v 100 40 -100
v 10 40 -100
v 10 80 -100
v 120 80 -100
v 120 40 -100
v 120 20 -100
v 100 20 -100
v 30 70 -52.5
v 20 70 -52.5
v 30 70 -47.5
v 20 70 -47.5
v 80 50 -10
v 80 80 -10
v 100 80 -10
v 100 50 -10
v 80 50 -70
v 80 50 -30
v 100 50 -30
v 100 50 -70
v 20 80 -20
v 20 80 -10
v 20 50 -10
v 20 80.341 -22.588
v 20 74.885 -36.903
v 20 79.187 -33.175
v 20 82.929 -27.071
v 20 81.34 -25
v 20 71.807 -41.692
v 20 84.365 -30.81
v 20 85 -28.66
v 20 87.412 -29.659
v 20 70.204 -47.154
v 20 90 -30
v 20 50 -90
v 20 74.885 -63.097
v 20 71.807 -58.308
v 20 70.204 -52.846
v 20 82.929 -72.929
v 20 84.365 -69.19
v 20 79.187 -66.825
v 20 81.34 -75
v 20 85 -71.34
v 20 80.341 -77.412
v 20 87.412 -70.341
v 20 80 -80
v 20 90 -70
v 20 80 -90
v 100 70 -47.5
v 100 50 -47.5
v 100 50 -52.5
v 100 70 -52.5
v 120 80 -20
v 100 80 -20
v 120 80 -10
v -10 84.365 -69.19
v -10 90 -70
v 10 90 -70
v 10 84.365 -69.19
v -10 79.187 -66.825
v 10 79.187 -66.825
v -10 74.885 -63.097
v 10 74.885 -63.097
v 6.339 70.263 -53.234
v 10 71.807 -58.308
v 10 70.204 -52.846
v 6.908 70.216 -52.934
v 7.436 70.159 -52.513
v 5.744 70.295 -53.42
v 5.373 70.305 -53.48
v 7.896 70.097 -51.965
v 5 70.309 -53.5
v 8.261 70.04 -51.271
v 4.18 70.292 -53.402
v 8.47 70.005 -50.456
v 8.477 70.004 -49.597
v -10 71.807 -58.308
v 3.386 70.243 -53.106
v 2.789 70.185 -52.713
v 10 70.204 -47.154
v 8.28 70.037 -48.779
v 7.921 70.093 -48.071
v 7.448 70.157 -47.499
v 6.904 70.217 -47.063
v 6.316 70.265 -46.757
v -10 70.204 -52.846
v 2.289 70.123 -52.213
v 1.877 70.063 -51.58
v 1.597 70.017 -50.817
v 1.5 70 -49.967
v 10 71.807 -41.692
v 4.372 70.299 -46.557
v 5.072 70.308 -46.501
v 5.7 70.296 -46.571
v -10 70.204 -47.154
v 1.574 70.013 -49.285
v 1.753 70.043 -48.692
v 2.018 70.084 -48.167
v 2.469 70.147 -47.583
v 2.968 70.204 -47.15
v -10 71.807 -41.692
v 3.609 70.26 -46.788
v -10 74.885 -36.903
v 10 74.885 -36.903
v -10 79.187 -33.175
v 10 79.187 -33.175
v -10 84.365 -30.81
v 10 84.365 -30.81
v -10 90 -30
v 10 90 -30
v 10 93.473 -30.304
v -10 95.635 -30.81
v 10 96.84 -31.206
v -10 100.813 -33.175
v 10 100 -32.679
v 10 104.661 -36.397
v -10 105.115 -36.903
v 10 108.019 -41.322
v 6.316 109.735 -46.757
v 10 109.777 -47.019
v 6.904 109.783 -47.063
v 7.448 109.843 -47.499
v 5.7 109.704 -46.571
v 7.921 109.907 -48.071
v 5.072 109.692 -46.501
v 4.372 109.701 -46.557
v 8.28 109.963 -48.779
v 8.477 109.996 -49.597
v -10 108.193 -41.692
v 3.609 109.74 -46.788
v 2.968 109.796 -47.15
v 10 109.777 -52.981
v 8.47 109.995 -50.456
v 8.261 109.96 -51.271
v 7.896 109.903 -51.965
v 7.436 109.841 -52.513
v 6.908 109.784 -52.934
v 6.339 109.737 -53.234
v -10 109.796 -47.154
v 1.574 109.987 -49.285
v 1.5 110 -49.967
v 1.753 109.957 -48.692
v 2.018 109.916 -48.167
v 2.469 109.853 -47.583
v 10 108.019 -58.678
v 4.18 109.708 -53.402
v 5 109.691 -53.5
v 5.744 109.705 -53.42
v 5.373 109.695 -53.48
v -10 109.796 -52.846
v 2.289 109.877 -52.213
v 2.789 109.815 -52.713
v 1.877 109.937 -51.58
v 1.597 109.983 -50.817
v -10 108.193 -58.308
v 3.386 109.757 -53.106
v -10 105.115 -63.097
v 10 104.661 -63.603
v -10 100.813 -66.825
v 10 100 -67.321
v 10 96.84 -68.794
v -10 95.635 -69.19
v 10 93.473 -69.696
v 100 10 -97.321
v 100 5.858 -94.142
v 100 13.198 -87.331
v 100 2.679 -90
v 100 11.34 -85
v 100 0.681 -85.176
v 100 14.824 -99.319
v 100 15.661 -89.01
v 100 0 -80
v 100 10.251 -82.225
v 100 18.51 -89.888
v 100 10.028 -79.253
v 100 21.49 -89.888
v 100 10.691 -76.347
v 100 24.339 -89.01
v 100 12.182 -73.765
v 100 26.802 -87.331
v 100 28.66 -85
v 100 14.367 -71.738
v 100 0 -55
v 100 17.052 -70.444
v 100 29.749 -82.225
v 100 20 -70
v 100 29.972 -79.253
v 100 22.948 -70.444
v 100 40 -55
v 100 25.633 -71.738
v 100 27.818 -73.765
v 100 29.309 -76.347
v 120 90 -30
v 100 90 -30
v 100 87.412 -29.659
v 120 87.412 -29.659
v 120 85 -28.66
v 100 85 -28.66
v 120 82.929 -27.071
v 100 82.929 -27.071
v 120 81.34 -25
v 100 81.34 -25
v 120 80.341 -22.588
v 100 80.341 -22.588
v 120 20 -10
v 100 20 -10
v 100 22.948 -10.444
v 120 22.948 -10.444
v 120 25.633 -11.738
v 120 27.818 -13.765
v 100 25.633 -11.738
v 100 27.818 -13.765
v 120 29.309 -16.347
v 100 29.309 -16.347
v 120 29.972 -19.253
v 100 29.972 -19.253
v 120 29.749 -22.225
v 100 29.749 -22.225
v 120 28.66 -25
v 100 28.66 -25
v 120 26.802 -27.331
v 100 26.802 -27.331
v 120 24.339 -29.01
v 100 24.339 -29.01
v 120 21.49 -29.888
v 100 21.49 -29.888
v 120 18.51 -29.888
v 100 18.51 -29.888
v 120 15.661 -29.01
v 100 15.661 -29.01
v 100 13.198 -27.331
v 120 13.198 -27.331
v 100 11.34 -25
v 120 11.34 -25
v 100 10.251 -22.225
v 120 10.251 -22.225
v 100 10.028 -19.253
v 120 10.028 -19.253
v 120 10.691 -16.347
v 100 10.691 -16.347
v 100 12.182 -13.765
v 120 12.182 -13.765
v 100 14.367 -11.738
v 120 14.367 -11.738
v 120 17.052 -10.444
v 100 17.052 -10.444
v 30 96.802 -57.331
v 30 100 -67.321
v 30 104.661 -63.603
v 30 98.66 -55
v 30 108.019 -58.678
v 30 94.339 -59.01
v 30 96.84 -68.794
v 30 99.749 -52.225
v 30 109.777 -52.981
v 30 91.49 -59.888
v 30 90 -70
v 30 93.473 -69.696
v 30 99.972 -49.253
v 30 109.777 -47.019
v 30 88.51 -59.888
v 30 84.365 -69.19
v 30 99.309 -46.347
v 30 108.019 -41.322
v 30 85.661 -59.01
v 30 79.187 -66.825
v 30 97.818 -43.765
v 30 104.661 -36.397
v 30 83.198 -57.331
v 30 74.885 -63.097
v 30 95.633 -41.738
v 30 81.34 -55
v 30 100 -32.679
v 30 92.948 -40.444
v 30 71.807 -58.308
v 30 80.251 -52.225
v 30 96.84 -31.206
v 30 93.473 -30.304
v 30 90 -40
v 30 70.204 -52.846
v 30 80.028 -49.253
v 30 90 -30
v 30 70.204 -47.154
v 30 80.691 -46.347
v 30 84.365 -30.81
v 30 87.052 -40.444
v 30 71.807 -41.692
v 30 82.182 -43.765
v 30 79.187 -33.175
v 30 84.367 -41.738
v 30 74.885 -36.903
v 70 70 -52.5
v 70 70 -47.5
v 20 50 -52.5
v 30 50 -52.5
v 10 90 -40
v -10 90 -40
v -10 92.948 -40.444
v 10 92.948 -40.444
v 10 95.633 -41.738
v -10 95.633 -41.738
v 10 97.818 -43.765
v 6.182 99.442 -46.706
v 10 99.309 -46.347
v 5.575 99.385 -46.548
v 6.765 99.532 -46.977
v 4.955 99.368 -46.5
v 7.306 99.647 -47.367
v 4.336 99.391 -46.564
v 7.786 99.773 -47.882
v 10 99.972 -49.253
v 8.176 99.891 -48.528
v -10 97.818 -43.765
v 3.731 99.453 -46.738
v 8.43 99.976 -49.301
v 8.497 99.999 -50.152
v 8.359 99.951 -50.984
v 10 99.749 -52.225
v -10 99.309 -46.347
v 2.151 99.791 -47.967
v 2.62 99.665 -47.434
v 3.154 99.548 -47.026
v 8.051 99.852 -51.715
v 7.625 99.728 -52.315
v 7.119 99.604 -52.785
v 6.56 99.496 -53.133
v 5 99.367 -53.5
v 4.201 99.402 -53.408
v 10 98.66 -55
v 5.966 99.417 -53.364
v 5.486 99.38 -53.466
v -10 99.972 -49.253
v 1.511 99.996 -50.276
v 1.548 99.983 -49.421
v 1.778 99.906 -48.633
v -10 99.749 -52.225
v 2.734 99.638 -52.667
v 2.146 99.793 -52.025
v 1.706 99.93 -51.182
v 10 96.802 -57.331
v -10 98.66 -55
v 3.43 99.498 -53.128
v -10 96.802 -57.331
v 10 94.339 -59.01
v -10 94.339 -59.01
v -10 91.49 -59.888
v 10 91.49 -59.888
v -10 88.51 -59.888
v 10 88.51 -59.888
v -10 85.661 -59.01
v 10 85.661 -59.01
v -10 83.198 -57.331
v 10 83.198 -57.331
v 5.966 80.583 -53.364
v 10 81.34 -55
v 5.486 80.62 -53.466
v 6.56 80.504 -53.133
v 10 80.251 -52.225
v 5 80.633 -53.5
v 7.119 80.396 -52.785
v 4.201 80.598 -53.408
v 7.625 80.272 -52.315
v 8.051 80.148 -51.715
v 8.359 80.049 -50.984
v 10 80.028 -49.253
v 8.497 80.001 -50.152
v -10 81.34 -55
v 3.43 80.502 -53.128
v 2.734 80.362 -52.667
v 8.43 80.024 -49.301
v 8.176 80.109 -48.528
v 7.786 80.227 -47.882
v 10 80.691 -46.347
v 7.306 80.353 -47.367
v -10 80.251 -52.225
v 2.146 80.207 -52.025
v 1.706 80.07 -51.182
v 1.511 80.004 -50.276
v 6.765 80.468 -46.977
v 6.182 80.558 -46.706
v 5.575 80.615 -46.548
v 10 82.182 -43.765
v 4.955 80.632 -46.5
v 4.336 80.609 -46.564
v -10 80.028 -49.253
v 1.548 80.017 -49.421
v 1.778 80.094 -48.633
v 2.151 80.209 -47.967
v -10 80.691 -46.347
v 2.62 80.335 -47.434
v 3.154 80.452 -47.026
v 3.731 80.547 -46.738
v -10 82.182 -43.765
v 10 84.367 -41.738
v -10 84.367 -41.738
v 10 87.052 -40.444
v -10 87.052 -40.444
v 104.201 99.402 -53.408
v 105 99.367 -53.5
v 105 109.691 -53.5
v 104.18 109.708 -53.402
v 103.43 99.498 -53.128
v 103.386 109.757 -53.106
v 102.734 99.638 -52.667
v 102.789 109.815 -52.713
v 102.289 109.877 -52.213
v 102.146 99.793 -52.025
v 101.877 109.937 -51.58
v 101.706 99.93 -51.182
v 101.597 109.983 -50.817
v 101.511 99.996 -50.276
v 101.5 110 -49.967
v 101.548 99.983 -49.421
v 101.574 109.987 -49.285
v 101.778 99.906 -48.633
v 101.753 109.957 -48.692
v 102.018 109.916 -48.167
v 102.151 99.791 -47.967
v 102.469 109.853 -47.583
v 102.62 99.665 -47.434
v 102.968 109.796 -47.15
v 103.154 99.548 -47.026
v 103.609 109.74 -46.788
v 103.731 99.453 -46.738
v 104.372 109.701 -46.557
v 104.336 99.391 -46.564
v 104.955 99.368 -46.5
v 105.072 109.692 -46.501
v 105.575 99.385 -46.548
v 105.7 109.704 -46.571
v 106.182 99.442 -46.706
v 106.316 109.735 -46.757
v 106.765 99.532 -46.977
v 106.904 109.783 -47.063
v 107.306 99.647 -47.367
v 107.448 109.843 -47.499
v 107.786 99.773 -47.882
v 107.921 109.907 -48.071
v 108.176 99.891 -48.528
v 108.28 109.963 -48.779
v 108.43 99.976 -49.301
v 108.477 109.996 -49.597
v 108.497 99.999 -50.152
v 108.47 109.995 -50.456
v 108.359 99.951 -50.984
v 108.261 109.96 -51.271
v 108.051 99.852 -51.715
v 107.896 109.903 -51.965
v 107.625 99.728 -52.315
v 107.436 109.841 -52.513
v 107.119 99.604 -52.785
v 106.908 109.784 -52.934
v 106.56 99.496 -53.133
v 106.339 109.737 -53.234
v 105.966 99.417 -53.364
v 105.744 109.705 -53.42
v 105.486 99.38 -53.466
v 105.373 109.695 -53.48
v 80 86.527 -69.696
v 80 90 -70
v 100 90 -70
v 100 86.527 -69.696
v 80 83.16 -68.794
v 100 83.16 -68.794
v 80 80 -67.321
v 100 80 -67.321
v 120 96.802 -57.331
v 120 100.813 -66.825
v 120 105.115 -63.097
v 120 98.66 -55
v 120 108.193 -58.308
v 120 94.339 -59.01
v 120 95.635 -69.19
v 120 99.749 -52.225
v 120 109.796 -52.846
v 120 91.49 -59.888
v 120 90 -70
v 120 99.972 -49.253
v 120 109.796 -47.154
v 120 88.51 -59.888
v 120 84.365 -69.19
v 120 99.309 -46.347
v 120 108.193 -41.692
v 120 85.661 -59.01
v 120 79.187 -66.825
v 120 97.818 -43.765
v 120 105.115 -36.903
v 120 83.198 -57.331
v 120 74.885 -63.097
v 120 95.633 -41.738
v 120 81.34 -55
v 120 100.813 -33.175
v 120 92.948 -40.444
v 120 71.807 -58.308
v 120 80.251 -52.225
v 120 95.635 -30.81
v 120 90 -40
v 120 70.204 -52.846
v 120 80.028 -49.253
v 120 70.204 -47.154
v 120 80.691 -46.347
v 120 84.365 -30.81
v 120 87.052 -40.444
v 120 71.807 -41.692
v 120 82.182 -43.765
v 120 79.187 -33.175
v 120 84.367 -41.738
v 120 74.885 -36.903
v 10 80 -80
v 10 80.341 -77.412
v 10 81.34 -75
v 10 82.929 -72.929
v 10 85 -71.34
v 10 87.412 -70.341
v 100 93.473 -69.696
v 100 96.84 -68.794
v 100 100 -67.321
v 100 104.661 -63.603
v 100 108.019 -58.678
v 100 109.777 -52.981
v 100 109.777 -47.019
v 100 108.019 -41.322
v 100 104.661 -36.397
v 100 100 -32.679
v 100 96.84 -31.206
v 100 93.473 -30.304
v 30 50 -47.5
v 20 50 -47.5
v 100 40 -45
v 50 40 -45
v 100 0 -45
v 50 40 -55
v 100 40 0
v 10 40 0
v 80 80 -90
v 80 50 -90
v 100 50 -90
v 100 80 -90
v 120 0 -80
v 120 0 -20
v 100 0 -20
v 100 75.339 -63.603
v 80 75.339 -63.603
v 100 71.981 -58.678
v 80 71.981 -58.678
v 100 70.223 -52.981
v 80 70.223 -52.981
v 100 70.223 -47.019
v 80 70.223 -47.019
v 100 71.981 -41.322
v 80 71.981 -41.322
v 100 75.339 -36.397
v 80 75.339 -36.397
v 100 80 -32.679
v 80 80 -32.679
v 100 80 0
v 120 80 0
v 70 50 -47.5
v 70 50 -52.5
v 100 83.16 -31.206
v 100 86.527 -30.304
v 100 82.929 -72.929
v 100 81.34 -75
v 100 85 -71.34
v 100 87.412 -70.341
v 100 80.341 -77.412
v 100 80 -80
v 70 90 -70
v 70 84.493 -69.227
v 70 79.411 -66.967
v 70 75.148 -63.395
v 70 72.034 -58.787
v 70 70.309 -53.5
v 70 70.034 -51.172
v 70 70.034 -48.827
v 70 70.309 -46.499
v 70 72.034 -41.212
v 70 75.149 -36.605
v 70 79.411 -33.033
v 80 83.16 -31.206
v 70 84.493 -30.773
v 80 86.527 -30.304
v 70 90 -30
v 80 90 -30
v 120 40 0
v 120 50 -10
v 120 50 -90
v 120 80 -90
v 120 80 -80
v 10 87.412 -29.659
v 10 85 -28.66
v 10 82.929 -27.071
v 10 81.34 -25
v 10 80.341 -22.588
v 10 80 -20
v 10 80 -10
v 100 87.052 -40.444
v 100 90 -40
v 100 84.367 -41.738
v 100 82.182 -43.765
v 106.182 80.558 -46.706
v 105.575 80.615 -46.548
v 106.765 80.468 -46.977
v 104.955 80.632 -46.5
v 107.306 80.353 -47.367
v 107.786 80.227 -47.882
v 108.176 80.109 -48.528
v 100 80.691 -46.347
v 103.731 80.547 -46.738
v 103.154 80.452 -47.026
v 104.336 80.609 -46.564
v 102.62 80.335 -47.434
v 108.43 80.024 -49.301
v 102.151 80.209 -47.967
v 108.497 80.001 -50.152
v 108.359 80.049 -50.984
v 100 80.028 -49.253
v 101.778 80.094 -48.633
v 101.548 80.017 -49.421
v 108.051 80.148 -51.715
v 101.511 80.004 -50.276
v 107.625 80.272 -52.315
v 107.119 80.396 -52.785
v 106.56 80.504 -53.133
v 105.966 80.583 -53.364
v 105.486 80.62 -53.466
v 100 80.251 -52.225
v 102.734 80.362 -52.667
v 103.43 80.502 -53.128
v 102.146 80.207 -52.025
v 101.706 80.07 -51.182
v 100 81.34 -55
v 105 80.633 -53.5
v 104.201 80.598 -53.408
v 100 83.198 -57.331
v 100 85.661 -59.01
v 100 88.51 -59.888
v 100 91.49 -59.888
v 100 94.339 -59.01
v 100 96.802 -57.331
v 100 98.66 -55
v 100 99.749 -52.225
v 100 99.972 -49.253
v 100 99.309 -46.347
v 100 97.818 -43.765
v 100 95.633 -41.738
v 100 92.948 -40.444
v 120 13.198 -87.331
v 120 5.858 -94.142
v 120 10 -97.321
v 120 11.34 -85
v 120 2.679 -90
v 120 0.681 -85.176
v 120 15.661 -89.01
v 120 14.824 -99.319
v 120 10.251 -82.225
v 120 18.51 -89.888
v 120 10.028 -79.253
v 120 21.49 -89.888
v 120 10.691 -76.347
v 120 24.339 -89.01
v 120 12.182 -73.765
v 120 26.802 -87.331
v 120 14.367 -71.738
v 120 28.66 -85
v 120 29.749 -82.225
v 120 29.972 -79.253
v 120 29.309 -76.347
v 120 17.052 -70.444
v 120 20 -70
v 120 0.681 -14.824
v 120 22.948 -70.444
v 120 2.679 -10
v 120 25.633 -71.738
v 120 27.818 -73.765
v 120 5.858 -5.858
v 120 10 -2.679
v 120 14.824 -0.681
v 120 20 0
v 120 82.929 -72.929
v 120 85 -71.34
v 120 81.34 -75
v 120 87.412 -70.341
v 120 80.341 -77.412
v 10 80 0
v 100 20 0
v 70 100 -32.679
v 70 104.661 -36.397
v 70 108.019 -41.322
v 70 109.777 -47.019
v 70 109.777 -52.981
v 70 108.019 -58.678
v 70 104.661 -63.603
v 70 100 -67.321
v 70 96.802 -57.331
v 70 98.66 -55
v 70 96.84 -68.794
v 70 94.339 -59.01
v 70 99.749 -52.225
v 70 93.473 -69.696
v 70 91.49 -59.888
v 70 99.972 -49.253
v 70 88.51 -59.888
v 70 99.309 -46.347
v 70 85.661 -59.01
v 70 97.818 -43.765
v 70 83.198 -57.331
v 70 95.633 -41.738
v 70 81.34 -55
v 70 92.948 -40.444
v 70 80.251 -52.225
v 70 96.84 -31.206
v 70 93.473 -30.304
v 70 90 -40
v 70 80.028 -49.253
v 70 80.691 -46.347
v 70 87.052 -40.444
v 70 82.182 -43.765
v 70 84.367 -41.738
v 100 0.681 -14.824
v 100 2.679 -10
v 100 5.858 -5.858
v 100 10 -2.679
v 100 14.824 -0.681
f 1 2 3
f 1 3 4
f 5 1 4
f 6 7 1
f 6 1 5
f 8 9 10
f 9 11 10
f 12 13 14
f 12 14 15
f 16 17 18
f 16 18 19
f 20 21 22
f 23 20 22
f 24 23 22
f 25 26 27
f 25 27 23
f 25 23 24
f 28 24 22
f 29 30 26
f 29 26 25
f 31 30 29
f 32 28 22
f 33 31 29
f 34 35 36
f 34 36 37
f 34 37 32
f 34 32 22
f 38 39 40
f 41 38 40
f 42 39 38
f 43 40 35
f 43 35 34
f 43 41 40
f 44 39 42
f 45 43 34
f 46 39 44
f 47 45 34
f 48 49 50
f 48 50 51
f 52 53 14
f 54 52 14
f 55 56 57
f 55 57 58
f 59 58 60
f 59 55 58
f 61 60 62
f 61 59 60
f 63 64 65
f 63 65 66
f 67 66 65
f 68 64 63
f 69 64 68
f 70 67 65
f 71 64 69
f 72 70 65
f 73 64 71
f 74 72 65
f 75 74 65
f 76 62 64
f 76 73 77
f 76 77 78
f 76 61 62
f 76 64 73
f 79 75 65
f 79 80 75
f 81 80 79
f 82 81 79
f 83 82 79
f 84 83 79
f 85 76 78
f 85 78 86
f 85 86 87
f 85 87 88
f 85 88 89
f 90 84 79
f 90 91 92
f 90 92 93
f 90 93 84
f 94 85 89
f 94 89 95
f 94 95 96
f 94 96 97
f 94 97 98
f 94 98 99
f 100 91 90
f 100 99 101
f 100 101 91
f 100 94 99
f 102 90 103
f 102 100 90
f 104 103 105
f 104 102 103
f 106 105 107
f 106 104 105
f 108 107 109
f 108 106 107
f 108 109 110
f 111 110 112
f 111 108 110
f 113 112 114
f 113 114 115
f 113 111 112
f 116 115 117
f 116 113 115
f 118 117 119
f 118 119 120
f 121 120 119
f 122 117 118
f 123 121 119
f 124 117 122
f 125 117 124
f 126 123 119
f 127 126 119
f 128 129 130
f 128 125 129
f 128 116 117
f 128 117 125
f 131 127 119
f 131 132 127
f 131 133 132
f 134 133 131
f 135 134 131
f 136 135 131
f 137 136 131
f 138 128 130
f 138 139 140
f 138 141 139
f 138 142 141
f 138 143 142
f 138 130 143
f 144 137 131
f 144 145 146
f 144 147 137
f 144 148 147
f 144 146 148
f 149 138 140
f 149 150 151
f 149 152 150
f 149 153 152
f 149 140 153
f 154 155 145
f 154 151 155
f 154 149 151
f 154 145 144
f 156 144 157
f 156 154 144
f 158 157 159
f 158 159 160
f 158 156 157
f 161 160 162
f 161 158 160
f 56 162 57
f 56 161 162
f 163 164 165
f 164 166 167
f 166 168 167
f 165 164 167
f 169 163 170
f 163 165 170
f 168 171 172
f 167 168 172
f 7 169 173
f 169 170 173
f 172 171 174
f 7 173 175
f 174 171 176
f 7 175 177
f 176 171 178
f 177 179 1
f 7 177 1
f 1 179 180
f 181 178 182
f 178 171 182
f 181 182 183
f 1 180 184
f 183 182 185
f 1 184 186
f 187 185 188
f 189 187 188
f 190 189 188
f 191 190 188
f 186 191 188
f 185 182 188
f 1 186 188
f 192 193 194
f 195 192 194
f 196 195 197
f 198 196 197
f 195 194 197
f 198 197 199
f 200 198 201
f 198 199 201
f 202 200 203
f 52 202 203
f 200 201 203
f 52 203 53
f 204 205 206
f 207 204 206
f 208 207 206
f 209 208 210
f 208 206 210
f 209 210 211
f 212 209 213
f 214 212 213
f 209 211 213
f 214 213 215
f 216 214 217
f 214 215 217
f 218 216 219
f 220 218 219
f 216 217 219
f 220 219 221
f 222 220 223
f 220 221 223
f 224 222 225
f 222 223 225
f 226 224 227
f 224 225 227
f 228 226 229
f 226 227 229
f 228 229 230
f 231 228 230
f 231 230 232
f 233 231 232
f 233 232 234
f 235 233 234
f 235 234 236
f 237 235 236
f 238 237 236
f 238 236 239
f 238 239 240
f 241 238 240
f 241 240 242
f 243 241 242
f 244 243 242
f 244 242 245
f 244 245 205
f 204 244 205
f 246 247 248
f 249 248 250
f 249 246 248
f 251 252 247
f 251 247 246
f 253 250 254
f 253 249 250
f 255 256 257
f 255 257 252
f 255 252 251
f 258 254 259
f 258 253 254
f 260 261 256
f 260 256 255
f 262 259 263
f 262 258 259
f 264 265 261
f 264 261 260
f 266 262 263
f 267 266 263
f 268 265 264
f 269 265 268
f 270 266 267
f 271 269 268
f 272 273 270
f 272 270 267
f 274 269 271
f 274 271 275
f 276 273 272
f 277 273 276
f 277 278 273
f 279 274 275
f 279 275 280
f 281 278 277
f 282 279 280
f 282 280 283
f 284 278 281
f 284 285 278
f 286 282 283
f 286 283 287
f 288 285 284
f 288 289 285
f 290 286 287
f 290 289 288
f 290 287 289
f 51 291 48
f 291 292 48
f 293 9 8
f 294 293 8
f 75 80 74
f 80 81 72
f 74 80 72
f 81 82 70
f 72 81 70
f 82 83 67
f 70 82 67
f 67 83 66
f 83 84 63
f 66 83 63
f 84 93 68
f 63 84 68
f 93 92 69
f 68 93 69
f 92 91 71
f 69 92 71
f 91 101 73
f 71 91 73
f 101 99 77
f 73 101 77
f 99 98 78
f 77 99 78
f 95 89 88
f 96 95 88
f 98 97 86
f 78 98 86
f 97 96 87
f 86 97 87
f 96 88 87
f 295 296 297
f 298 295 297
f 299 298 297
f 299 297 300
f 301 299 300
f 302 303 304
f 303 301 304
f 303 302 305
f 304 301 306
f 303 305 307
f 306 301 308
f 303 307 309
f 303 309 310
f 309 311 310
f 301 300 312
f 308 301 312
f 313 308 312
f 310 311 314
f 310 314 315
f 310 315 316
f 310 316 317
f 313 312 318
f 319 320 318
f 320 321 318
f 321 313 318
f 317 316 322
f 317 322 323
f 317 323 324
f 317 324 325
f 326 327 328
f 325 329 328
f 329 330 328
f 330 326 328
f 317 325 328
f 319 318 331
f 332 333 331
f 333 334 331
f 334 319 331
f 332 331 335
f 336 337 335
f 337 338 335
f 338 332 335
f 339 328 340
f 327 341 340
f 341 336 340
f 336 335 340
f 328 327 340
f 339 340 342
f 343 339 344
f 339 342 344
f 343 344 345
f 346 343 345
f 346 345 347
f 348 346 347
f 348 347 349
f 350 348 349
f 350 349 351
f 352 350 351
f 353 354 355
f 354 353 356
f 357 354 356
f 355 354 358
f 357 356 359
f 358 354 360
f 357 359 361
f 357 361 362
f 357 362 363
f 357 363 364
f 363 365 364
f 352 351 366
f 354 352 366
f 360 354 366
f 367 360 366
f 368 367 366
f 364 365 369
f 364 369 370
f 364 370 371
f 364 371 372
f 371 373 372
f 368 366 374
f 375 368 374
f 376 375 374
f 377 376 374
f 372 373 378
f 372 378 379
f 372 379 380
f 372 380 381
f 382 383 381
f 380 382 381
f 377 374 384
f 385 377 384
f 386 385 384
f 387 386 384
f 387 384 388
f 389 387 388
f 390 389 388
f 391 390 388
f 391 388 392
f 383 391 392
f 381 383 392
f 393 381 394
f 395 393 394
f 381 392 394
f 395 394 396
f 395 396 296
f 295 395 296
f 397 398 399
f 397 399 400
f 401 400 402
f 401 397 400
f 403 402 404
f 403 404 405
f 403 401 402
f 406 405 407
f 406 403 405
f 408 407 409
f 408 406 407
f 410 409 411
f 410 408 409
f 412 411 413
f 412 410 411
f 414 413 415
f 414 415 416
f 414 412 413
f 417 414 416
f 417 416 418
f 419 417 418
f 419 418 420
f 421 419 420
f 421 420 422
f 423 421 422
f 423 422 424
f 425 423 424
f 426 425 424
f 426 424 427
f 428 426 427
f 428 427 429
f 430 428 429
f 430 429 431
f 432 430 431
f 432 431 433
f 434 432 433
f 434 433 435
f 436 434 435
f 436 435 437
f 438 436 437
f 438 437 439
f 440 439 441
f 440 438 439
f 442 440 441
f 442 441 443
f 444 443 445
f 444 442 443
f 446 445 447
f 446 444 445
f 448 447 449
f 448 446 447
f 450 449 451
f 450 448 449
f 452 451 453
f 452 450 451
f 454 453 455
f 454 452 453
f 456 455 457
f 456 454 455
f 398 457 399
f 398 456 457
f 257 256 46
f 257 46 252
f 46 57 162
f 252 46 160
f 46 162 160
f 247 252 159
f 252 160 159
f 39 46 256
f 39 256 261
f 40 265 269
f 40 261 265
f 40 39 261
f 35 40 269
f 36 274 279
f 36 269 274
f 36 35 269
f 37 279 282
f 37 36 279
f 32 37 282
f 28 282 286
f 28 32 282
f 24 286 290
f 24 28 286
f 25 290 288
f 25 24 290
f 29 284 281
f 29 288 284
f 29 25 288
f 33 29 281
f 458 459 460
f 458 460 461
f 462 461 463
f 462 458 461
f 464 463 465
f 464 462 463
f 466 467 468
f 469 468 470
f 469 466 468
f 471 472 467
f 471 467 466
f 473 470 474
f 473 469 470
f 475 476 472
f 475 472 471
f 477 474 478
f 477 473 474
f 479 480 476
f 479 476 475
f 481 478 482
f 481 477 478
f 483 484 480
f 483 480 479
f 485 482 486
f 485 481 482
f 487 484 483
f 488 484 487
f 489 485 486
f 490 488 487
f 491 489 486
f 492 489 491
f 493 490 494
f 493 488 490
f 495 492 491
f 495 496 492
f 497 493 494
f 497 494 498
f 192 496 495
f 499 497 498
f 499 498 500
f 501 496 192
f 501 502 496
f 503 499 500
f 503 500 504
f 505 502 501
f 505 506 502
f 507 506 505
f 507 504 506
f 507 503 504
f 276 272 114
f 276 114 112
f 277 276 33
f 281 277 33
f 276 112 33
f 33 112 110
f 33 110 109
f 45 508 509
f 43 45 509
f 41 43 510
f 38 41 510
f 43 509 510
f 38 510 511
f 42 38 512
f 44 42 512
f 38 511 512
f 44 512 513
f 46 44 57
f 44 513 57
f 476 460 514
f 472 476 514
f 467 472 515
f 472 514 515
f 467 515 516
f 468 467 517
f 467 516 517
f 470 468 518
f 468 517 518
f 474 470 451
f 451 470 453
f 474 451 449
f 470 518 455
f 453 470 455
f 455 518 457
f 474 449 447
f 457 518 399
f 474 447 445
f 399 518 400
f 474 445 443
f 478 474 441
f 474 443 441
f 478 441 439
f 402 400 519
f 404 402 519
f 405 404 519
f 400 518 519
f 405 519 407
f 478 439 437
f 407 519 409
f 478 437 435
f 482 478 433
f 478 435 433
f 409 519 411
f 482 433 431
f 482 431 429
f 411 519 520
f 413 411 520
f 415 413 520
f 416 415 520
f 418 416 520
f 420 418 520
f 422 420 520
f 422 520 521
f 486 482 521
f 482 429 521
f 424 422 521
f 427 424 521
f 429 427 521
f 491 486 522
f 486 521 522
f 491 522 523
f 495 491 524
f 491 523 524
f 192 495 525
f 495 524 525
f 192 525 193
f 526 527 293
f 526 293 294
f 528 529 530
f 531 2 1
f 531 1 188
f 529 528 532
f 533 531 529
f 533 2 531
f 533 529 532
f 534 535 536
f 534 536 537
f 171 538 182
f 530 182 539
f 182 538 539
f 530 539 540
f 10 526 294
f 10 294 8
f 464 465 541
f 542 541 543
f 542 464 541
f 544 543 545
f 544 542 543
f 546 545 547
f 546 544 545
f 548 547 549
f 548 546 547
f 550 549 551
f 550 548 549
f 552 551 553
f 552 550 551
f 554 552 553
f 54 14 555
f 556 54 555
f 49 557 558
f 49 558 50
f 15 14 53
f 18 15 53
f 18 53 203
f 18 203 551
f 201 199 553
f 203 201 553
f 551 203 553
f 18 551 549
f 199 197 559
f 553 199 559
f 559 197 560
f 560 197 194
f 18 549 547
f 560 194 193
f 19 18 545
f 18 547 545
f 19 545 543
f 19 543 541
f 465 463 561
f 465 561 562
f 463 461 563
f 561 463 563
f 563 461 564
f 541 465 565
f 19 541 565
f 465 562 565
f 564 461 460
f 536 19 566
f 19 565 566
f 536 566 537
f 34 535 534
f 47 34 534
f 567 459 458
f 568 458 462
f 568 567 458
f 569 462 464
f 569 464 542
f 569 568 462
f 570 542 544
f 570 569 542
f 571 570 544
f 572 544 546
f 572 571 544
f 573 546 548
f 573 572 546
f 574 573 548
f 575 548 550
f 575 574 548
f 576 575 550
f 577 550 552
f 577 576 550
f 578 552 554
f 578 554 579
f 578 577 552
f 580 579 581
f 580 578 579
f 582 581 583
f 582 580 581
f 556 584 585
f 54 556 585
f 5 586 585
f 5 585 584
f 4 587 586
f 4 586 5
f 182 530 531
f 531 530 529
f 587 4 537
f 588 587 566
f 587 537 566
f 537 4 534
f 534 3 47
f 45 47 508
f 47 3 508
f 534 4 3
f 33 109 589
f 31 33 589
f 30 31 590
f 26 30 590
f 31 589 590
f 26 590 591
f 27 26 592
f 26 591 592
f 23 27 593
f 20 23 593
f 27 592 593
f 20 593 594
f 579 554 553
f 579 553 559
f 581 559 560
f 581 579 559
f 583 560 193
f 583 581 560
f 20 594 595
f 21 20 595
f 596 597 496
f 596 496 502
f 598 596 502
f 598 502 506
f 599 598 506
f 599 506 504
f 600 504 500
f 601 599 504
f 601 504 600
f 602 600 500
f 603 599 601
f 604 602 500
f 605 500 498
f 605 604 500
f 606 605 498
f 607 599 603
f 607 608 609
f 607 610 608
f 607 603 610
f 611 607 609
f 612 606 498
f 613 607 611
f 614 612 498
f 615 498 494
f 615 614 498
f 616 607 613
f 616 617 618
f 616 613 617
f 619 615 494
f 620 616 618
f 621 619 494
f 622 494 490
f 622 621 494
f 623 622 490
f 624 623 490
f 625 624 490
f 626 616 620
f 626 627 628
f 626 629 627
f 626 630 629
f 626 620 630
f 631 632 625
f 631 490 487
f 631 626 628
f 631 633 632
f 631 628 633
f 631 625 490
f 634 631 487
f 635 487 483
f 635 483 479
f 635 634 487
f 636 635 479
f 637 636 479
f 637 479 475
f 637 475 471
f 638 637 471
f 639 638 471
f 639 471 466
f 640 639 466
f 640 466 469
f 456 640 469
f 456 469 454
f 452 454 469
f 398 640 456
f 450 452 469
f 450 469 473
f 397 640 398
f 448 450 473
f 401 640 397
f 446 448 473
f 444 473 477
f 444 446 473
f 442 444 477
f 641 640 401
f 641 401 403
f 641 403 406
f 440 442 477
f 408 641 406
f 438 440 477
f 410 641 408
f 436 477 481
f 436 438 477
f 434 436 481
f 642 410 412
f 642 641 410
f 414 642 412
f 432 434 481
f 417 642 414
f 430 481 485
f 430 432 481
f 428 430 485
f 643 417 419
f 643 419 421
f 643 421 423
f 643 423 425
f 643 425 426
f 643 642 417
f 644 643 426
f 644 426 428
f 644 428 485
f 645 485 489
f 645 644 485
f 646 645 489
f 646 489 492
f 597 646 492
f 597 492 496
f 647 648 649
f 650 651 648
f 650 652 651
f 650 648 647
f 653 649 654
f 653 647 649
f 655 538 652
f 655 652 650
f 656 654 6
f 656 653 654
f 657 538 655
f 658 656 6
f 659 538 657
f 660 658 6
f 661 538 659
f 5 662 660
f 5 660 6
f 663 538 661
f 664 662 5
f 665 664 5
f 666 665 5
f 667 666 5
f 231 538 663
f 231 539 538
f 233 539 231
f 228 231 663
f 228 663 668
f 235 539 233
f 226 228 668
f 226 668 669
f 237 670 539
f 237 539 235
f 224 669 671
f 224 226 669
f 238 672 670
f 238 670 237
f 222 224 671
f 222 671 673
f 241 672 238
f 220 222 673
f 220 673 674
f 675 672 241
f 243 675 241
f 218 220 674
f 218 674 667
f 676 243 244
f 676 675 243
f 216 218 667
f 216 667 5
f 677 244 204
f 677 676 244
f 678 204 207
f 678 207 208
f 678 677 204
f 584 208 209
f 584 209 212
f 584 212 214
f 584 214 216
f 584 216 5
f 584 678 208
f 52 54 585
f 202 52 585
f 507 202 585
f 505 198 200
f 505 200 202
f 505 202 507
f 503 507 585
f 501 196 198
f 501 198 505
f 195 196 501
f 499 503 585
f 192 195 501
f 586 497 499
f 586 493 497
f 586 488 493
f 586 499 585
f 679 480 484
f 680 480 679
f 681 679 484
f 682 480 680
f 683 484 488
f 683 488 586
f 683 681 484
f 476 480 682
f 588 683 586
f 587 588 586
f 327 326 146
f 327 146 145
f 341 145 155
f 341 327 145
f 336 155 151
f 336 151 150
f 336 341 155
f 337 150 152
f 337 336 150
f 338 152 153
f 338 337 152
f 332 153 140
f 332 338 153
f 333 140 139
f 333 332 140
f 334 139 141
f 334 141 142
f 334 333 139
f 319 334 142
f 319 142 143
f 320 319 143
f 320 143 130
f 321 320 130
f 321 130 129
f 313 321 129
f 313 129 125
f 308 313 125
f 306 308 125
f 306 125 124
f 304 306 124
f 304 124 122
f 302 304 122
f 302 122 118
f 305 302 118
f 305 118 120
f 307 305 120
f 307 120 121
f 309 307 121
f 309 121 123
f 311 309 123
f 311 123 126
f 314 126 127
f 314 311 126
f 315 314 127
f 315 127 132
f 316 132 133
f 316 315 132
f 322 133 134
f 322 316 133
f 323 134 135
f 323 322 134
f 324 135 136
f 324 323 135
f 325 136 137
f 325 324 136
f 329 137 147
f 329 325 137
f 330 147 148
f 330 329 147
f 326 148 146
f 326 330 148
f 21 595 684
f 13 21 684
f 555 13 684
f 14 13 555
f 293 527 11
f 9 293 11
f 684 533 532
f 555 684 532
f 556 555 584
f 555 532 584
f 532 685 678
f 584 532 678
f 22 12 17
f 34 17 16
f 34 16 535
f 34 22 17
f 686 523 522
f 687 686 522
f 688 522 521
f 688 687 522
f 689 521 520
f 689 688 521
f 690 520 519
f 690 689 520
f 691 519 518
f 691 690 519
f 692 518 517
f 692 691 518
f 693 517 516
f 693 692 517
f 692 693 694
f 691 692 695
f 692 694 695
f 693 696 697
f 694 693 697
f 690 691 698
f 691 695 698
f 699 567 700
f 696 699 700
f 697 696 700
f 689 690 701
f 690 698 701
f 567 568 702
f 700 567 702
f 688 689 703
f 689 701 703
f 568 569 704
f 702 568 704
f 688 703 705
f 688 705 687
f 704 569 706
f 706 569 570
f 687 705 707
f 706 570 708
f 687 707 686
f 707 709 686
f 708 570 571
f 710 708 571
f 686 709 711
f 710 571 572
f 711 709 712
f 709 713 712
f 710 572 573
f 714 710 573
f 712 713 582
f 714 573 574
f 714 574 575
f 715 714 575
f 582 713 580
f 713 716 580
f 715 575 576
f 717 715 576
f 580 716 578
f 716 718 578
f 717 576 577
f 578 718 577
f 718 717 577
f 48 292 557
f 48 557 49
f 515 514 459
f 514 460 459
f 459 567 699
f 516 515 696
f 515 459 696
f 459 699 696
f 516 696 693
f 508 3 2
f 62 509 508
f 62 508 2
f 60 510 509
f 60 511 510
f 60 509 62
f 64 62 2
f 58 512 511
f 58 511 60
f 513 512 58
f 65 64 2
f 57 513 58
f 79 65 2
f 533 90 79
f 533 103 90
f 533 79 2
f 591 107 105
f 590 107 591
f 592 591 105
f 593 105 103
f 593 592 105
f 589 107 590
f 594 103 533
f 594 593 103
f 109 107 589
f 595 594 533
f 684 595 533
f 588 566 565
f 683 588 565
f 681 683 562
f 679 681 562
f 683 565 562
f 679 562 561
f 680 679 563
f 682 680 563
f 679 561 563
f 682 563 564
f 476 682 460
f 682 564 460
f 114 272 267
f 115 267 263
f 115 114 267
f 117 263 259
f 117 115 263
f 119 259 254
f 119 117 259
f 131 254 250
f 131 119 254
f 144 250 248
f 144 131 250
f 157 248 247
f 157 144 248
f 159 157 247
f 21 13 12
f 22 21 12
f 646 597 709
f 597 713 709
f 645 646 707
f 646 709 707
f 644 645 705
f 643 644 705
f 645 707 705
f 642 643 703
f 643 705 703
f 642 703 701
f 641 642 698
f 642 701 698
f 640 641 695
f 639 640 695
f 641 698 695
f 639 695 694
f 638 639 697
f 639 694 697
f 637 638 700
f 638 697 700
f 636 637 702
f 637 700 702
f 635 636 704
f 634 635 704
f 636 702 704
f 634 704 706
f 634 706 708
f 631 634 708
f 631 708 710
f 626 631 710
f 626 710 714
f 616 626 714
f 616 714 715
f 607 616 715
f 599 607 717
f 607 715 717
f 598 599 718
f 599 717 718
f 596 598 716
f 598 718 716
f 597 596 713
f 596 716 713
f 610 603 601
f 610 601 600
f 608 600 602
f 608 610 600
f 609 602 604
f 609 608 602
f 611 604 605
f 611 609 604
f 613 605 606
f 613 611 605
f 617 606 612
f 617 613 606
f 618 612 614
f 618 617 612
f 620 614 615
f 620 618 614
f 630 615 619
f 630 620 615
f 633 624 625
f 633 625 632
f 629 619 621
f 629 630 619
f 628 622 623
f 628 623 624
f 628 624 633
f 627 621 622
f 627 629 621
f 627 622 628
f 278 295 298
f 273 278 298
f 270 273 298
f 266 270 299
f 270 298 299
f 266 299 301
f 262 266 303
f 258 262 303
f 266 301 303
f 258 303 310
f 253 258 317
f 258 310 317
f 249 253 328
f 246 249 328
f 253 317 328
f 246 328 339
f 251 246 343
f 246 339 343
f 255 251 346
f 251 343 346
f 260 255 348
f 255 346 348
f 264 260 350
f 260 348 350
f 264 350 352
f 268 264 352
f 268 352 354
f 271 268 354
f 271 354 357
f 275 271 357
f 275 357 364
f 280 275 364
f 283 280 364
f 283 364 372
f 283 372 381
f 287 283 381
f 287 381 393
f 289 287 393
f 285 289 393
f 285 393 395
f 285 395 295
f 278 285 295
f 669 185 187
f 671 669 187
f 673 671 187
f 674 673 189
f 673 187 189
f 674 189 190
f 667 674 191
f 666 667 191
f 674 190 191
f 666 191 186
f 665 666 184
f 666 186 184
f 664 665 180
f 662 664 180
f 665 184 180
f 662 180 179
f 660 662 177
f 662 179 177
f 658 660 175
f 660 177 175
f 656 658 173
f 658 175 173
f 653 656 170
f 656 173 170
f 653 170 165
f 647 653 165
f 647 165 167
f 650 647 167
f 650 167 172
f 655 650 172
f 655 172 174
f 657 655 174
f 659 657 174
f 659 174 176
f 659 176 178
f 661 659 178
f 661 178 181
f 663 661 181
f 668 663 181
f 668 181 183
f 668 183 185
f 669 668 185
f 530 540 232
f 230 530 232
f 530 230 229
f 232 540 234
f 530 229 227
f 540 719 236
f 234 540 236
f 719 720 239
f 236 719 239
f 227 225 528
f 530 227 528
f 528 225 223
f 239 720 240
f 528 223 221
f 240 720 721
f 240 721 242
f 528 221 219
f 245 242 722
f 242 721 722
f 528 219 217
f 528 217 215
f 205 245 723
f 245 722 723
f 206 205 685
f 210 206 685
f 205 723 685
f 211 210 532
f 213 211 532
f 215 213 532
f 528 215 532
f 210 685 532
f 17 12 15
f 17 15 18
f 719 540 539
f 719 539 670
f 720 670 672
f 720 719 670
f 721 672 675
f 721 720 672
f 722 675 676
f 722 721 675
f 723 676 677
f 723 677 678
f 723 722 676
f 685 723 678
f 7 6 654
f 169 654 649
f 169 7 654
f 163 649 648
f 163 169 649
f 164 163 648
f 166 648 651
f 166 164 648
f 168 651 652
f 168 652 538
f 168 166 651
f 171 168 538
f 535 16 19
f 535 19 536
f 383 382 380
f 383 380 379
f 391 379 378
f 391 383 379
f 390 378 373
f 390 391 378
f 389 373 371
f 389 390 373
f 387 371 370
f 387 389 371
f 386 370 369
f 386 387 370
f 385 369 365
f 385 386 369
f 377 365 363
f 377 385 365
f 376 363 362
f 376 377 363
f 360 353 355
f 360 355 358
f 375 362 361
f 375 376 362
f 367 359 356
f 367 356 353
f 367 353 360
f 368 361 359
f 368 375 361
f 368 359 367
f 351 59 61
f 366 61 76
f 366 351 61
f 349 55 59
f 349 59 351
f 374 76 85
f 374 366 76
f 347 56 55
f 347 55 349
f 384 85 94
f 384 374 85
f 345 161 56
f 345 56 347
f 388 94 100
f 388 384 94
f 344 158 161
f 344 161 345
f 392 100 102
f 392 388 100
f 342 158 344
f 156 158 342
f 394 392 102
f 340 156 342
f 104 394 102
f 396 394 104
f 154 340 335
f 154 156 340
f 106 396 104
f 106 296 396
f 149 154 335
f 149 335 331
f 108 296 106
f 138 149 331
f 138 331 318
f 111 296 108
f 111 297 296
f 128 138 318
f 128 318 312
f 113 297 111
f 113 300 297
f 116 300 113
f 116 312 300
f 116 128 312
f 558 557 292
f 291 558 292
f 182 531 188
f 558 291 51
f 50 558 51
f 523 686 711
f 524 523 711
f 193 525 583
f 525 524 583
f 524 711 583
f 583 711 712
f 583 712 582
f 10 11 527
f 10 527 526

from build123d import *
from build123d.topology import SkipClean

# Parameters (mm, degrees)
SKETCH1_W                = 120
SKETCH1_H                = 100
BOSS_EXTRUDE1_DEPTH      = 100
CUT_EXTRUDE2_DEPTH       = 135
SKETCH3_W                = 20
SKETCH3_H                = 20
CUT_EXTRUDE3_DEPTH       = 135
CUT_EXTRUDE4_DEPTH       = 135
SKETCH5_R                = 20
BOSS_EXTRUDE2_DEPTH      = 120
BOSS_EXTRUDE3_START      = 10
SKETCH6_R                = 20
BOSS_EXTRUDE3_DEPTH      = 10
SKETCH7_R                = 10
CUT_EXTRUDE5_DEPTH       = 40
SKETCH8_R                = 20
CUT_EXTRUDE6_DEPTH       = 40
SKETCH9_R                = 10
CUT_EXTRUDE7_DEPTH       = 76
SKETCH10_R               = 3.5
CUT_EXTRUDE8_DEPTH       = 154
BOSS_EXTRUDE5_DEPTH      = 40
BOSS_EXTRUDE6_START      = -50.0000001
BOSS_EXTRUDE6_DEPTH      = 50.0000001
SKETCH13_R               = 3.5
BOSS_EXTRUDE7_DEPTH      = 50
SKETCH15_R               = 10
CUT_EXTRUDE11_DEPTH      = 152
CUT_EXTRUDE14_DEPTH      = 152
CUT_EXTRUDE14_DEPTH_BACK = 30
SKETCH16_OUTSIDE_W       = 171.496
SKETCH16_OUTSIDE_H       = 141.496
SKETCH16_OUTSIDE_W_2     = 90
SKETCH16_OUTSIDE_H_2     = 80
BOSS_EXTRUDE8_START      = 20
SKETCH17_R               = 20
SKETCH17_R_2             = 10
BOSS_EXTRUDE8_DEPTH      = 20
SKETCH18_R               = 20
SKETCH18_R_2             = 10
BOSS_EXTRUDE9_DEPTH      = 20
SKETCH19_W               = 10
SKETCH19_H               = 30
BOSS_EXTRUDE10_DEPTH     = 90
SKETCH20_W               = 90
SKETCH20_H               = 30
BOSS_EXTRUDE11_DEPTH     = 10
SKETCH22_W               = 100
SKETCH22_H               = 10
CUT_EXTRUDE15_DEPTH      = 10
SKETCH23_W               = 100
SKETCH23_H               = 10
CUT_EXTRUDE16_DEPTH      = 20
CUT_EXTRUDE19_START      = -20
CUT_EXTRUDE19_DEPTH      = 20
SKETCH25_R               = 3.5
CUT_EXTRUDE20_DEPTH      = 220
SKETCH26_R               = 3.5
BOSS_EXTRUDE15_DEPTH     = 85
CUT_EXTRUDE21_START      = 85
CUT_EXTRUDE21_DEPTH      = 85
CUT_EXTRUDE22_DEPTH      = 85
SKETCH30_W               = 90
SKETCH30_H               = 10
CUT_EXTRUDE23_DEPTH      = 85
CUT_EXTRUDE24_START      = -149
SKETCH31_R               = 10
CUT_EXTRUDE24_DEPTH      = 149
SKETCH34_W               = 10
SKETCH34_H               = 39.999
CUT_EXTRUDE33_DEPTH      = 30
SKETCH35_W               = 50
SKETCH35_H               = 10
CUT_EXTRUDE34_DEPTH      = 40
SKETCH36_W               = 112.854184332
SKETCH36_H               = 51.466709558
CUT_EXTRUDE35_DEPTH      = 100
CUT_EXTRUDE36_DEPTH      = 90
BOSS_EXTRUDE16_REACH     = 173.828
SKETCH38_W               = 20
SKETCH38_H               = 40
BOSS_EXTRUDE17_DEPTH     = 20
SKETCH40_W               = 50
SKETCH40_H               = 10
BOSS_EXTRUDE18_DEPTH     = 40
CHAMFER1_SIZE            = 50
CHAMFER1_SIZE_2          = 40
SKETCH41_W               = 10
SKETCH41_H               = 20
BOSS_EXTRUDE21_DEPTH     = 2.5
SKETCH41_W_2             = 30
BOSS_EXTRUDE21_2_DEPTH   = 2.5


with BuildPart() as part:
    # Sketch1 → Boss-Extrude1 (new body)
    with BuildSketch(Plane(origin=(0, 0, 0), x_dir=(1, 0, 0), z_dir=(0, 1, 0))):
        with Locations((60, 50)):
            Rectangle(SKETCH1_W, SKETCH1_H)
    extrude(amount=BOSS_EXTRUDE1_DEPTH)

    # Sketch2 → Cut-Extrude2 (cut)
    with BuildSketch(Plane(origin=(0, 0, 0), x_dir=(0, 0, -1), z_dir=(1, 0, 0))):
        with BuildLine():
            Line((80, 0), (100, 0))
            Line((100, 0), (100, 20))
            ThreePointArc((100, 20), (94.142135624, 5.857864376), (80, 0))
        make_face()
        with BuildLine():
            Line((0, 0), (20, 0))
            ThreePointArc((20, 0), (5.857864376, 5.857864376), (0, 20))
            Line((0, 20), (0, 0))
        make_face()
    extrude(amount=CUT_EXTRUDE2_DEPTH, mode=Mode.SUBTRACT)

    # Sketch3 → Cut-Extrude3 (cut)
    with BuildSketch(Plane.ZY):
        with Locations((-90, 90)):
            Rectangle(SKETCH3_W, SKETCH3_H)
        with Locations((-10, 90)):
            Rectangle(SKETCH3_W, SKETCH3_H)
    extrude(amount=-CUT_EXTRUDE3_DEPTH, mode=Mode.SUBTRACT)

    # Sketch4 → Cut-Extrude4 (cut)
    with BuildSketch(Plane.ZY):
        with BuildLine():
            Line((-80, 100), (-80, 80))
            ThreePointArc((-80, 80), (-72.928932188, 82.928932188), (-70, 90))
            ThreePointArc((-70, 90), (-69.318516526, 95.176380902), (-67.320508076, 100))
            Line((-67.320508076, 100), (-80, 100))
        make_face()
        with BuildLine():
            ThreePointArc((-32.679491924, 100), (-30.681483474, 95.176380902), (-30, 90))
            ThreePointArc((-30, 90), (-27.071067812, 82.928932188), (-20, 80))
            Line((-20, 80), (-20, 100))
            Line((-20, 100), (-32.679491924, 100))
        make_face()
    extrude(amount=-CUT_EXTRUDE4_DEPTH, mode=Mode.SUBTRACT)

    # Sketch5 → Boss-Extrude2 (add)
    with SkipClean():  # the faces are left unmerged after this step: merging them gives an invalid solid
        with BuildSketch(Plane.ZY):
            with Locations((-50, 90)):
                Circle(SKETCH5_R)
        extrude(amount=-BOSS_EXTRUDE2_DEPTH)

    # Sketch6 → Boss-Extrude3 (add)
    with SkipClean():  # the faces are left unmerged after this step: merging them gives an invalid solid
        with BuildSketch(Plane.ZY.offset(BOSS_EXTRUDE3_START)):
            with Locations((-50, 90)):
                Circle(SKETCH6_R)
        extrude(amount=-BOSS_EXTRUDE3_DEPTH)

    # Sketch7 → Cut-Extrude5 (cut)
    with SkipClean():  # the faces are left unmerged after this step: merging them gives an invalid solid
        with BuildSketch(Plane.ZY.offset(10)):
            with Locations((-50, 90)):
                Circle(SKETCH7_R)
        extrude(amount=-CUT_EXTRUDE5_DEPTH, mode=Mode.SUBTRACT)

    # Sketch8 → Cut-Extrude6 (cut)
    with SkipClean():  # the faces are left unmerged after this step: merging them gives an invalid solid
        with BuildSketch(Plane(origin=(30, 0, 0), x_dir=(0, 0, -1), z_dir=(1, 0, 0))):
            with Locations(Location((50, 90, 0), (0, 0, 180))):
                Circle(SKETCH8_R)
        extrude(amount=CUT_EXTRUDE6_DEPTH, mode=Mode.SUBTRACT)

    # Sketch9 → Cut-Extrude7 (cut)
    with SkipClean():  # the faces are left unmerged after this step: merging them gives an invalid solid
        with BuildSketch(Plane.ZY.offset(-70)):
            with Locations((-50, 90)):
                Circle(SKETCH9_R)
        extrude(amount=-CUT_EXTRUDE7_DEPTH, mode=Mode.SUBTRACT)

    # Sketch10 → Cut-Extrude8 (cut)
    with SkipClean():  # the faces are left unmerged after this step: merging them gives an invalid solid
        with BuildSketch(Plane(origin=(0, 0, 0), x_dir=(1, 0, 0), z_dir=(0, 1, 0))):
            with Locations(Location((5, 50, 0), (0, 0, 90))):
                Circle(SKETCH10_R)
            with Locations(Location((105, 50, 0), (0, 0, 90))):
                Circle(SKETCH10_R)
        extrude(amount=CUT_EXTRUDE8_DEPTH, mode=Mode.SUBTRACT)

    # Sketch11 → Boss-Extrude5 (add)
    with SkipClean():  # the faces are left unmerged after this step: merging them gives an invalid solid
        with BuildSketch(Plane.ZY.offset(10)):
            with BuildLine():
                ThreePointArc((-40, 90), (-50, 80), (-60, 90))
                Line((-60, 90), (-70, 90))
                ThreePointArc((-70, 90), (-50, 70), (-30, 90))
                Line((-30, 90), (-40, 90))
            make_face()
        extrude(amount=-BOSS_EXTRUDE5_DEPTH)
    add(part.part.scale(1), mode=Mode.REPLACE)  # the faces are merged on a copy

    # Boss-Extrude6: read off the stored shape, not the designer's step
    # Boss-Extrude6 outline → Boss-Extrude6 (add)
    with BuildSketch(Plane.ZY.offset(-70).offset(BOSS_EXTRUDE6_START)):
        with BuildLine():
            Line((-30, 90), (-40, 90))
            ThreePointArc((-40, 90), (-50, 80), (-60, 90))
            Line((-60, 90), (-70, 90))
            ThreePointArc((-70, 90), (-65.329710362, 77.154768192), (-53.500001979, 70.308631684))
            ThreePointArc((-53.500001979, 70.308631684), (-49.999509114, 70.000000006), (-46.499031404, 70.308803518))
            ThreePointArc((-46.499031404, 70.308803518), (-34.669974365, 77.155144452), (-30, 90))
        make_face()
    extrude(amount=BOSS_EXTRUDE6_DEPTH)

    # Sketch13 → Boss-Extrude7 (add)
    with SkipClean():  # the faces are left unmerged after this step: merging them gives an invalid solid
        with BuildSketch(Plane.XZ):
            with Locations(Location((5, -50, 0), (0, 0, 270))):
                Circle(SKETCH13_R)
            with Locations(Location((105, -50, 0), (0, 0, 270))):
                Circle(SKETCH13_R)
        extrude(amount=-BOSS_EXTRUDE7_DEPTH)

    # Sketch15 → Cut-Extrude11 (cut)
    with SkipClean():  # the faces are left unmerged after this step: merging them gives an invalid solid
        with BuildSketch(Plane.ZY):
            with Locations((-80, 20)):
                Circle(SKETCH15_R)
            with Locations((-20, 20)):
                Circle(SKETCH15_R)
        extrude(amount=-CUT_EXTRUDE11_DEPTH, mode=Mode.SUBTRACT)

    # Sketch16 outside → Cut-Extrude14 (cut, two sides: drawn at the far end of the back side and taken through both)
    with SkipClean():  # the faces are left unmerged after this step: merging them gives an invalid solid
        with BuildSketch(Plane(origin=(0, 80, 0), x_dir=(1, 0, 0), z_dir=(0, 1, 0)).offset(-CUT_EXTRUDE14_DEPTH_BACK)):
            with Locations((55, 50)):
                Rectangle(SKETCH16_OUTSIDE_W, SKETCH16_OUTSIDE_H)
            with Locations((55, 50)):
                Rectangle(SKETCH16_OUTSIDE_W_2, SKETCH16_OUTSIDE_H_2, mode=Mode.SUBTRACT)
        extrude(amount=CUT_EXTRUDE14_DEPTH + CUT_EXTRUDE14_DEPTH_BACK, mode=Mode.SUBTRACT)

    # Sketch17 → Boss-Extrude8 (add)
    with SkipClean():  # the faces are left unmerged after this step: merging them gives an invalid solid
        with BuildSketch(Plane.ZY.offset(-10).offset(BOSS_EXTRUDE8_START)):
            with Locations((-50, 90)):
                Circle(SKETCH17_R)
            with Locations((-50, 90)):
                Circle(SKETCH17_R_2, mode=Mode.SUBTRACT)
        extrude(amount=-BOSS_EXTRUDE8_DEPTH)

    # Sketch18 → Boss-Extrude9 (add)
    with SkipClean():  # the faces are left unmerged after this step: merging them gives an invalid solid
        with BuildSketch(Plane(origin=(100, 0, 0), x_dir=(0, 0, -1), z_dir=(1, 0, 0))):
            with Locations(Location((50, 90, 0), (0, 0, 180))):
                Circle(SKETCH18_R)
            with Locations(Location((50, 90, 0), (0, 0, 180))):
                Circle(SKETCH18_R_2, mode=Mode.SUBTRACT)
        extrude(amount=BOSS_EXTRUDE9_DEPTH)

    # Sketch19 → Boss-Extrude10 (add)
    with SkipClean():  # the faces are left unmerged after this step: merging them gives an invalid solid
        with BuildSketch(Plane.ZY.offset(-10)):
            with Locations((-95, 65)):
                Rectangle(SKETCH19_W, SKETCH19_H)
        extrude(amount=-BOSS_EXTRUDE10_DEPTH)

    # Sketch20 → Boss-Extrude11 (add)
    with SkipClean():  # the faces are left unmerged after this step: merging them gives an invalid solid
        with BuildSketch(Plane.XY.offset(-10)):
            with Locations((55, 65)):
                Rectangle(SKETCH20_W, SKETCH20_H)
        extrude(amount=BOSS_EXTRUDE11_DEPTH)

    # Sketch22 → Cut-Extrude15 (cut)
    with SkipClean():  # the faces are left unmerged after this step: merging them gives an invalid solid
        with BuildSketch(Plane.ZY):
            with Locations((-50, 45)):
                Rectangle(SKETCH22_W, SKETCH22_H)
        extrude(amount=-CUT_EXTRUDE15_DEPTH, mode=Mode.SUBTRACT)

    # Sketch23 → Cut-Extrude16 (cut)
    with SkipClean():  # the faces are left unmerged after this step: merging them gives an invalid solid
        with BuildSketch(Plane(origin=(120, 0, 0), x_dir=(0, 0, -1), z_dir=(1, 0, 0))):
            with Locations((50, 45)):
                Rectangle(SKETCH23_W, SKETCH23_H)
        extrude(amount=-CUT_EXTRUDE16_DEPTH, mode=Mode.SUBTRACT)

    # Sketch24 → Cut-Extrude19 (cut)
    with SkipClean():  # the faces are left unmerged after this step: merging them gives an invalid solid
        with BuildSketch(Plane(origin=(100, 0, 0), x_dir=(0, 0, -1), z_dir=(1, 0, 0)).offset(CUT_EXTRUDE19_START)):
            with BuildLine():
                ThreePointArc((30, 90), (27.071067812, 82.928932188), (20, 80))
                Line((20, 80), (32.679491924, 80))
                ThreePointArc((32.679491924, 80), (30.681483474, 84.823619098), (30, 90))
            make_face()
            with BuildLine():
                ThreePointArc((70, 90), (69.318516526, 84.823619098), (67.320508076, 80))
                Line((67.320508076, 80), (80, 80))
                ThreePointArc((80, 80), (72.928932188, 82.928932188), (70, 90))
            make_face()
            with BuildLine():
                Line((20, 80), (10, 80))
                Line((10, 80), (10, 50))
                Line((10, 50), (90, 50))
                Line((90, 50), (90, 80))
                Line((90, 80), (80, 80))
                Line((80, 80), (67.320508076, 80))
                ThreePointArc((67.320508076, 80), (50, 70), (32.679491924, 80))
                Line((32.679491924, 80), (20, 80))
            make_face()
        extrude(amount=CUT_EXTRUDE19_DEPTH, mode=Mode.SUBTRACT)

    # Sketch25 → Cut-Extrude20 (cut)
    with SkipClean():  # the faces are left unmerged after this step: merging them gives an invalid solid
        with BuildSketch(Plane(origin=(0, 0, 0), x_dir=(1, 0, 0), z_dir=(0, 1, 0))):
            with Locations(Location((5, 50, 0), (0, 0, 90))):
                Circle(SKETCH25_R)
            with Locations(Location((105, 50, 0), (0, 0, 90))):
                Circle(SKETCH25_R)
        extrude(amount=CUT_EXTRUDE20_DEPTH, mode=Mode.SUBTRACT)

    # Sketch26 → Boss-Extrude15 (add)
    with SkipClean():  # the faces are left unmerged after this step: merging them gives an invalid solid
        with BuildSketch(Plane.XZ):
            with Locations(Location((5, -50, 0), (0, 0, 270))):
                Circle(SKETCH26_R)
            with Locations(Location((105, -50, 0), (0, 0, 270))):
                Circle(SKETCH26_R)
        extrude(amount=-BOSS_EXTRUDE15_DEPTH)

    # Sketch27 → Cut-Extrude21 (cut)
    with SkipClean():  # the faces are left unmerged after this step: merging them gives an invalid solid
        with BuildSketch(Plane.ZY.offset(-10).offset(CUT_EXTRUDE21_START)):
            with BuildLine():
                Line((-70, 90), (-70, 39.958071387))
                Line((-70, 39.958071387), (-30, 40))
                Line((-30, 40), (-30, 90))
                ThreePointArc((-30, 90), (-50, 70), (-70, 90))
            make_face()
        extrude(amount=-CUT_EXTRUDE21_DEPTH, mode=Mode.SUBTRACT)
    add(part.part.scale(1), mode=Mode.REPLACE)  # the faces are merged on a copy

    # Sketch29 → Cut-Extrude22 (cut)
    with BuildSketch(Plane(origin=(80, 0, 0), x_dir=(0, 0, -1), z_dir=(1, 0, 0))):
        with BuildLine():
            Line((30, 90), (30, 50))
            Line((30, 50), (70, 50))
            Line((70, 50), (70, 90))
            ThreePointArc((70, 90), (50, 70), (30, 90))
        make_face()
    extrude(amount=CUT_EXTRUDE22_DEPTH, mode=Mode.SUBTRACT)

    # Sketch30 → Cut-Extrude23 (cut)
    with BuildSketch(Plane(origin=(100, 0, 0), x_dir=(0, 0, -1), z_dir=(1, 0, 0))):
        with Locations((55, 45)):
            Rectangle(SKETCH30_W, SKETCH30_H)
    extrude(amount=CUT_EXTRUDE23_DEPTH, mode=Mode.SUBTRACT)

    # Sketch31 → Cut-Extrude24 (cut)
    with BuildSketch(Plane(origin=(120, 0, 0), x_dir=(0, 0, -1), z_dir=(1, 0, 0)).offset(CUT_EXTRUDE24_START)):
        with Locations(Location((50, 90, 0), (0, 0, 180))):
            Circle(SKETCH31_R)
    extrude(amount=CUT_EXTRUDE24_DEPTH, mode=Mode.SUBTRACT)

    # Sketch34 → Cut-Extrude33 (cut)
    with BuildSketch(Plane.ZY):
        with Locations((-50, 19.9995)):
            Rectangle(SKETCH34_W, SKETCH34_H)
    extrude(amount=-CUT_EXTRUDE33_DEPTH, mode=Mode.SUBTRACT)

    # Sketch35 → Cut-Extrude34 (cut)
    with BuildSketch(Plane.XZ):
        with Locations((95, -50)):
            Rectangle(SKETCH35_W, SKETCH35_H)
    extrude(amount=-CUT_EXTRUDE34_DEPTH, mode=Mode.SUBTRACT)

    # Sketch36 → Cut-Extrude35 (cut)
    with BuildSketch(Plane.ZY):
        with Locations((-43.572907834, 14.266645221)):
            Rectangle(SKETCH36_W, SKETCH36_H)
    extrude(amount=-CUT_EXTRUDE35_DEPTH, mode=Mode.SUBTRACT)


with BuildPart() as cut_extrude35_piece_1:
    # of the separate pieces the step leaves, piece 1, a body of its own (cut_extrude35_pieces)
    add(part.part.solids().sort_by_distance((100, 80, 0))[0])

    # Sketch37 → Cut-Extrude36 (cut)
    with SkipClean():  # the faces are left unmerged after this step: merging them gives an invalid solid
        with BuildSketch(Plane(origin=(20, 0, 0), x_dir=(0, 0, -1), z_dir=(1, 0, 0))):
            with BuildLine():
                Line((90, 80), (80, 80))
                ThreePointArc((80, 80), (72.928932188, 82.928932188), (70, 90))
                ThreePointArc((70, 90), (50, 70), (30, 90))
                ThreePointArc((30, 90), (27.071067812, 82.928932188), (20, 80))
                Line((20, 80), (10, 80))
                Line((10, 80), (10, 50))
                Line((10, 50), (90, 50))
                Line((90, 50), (90, 80))
            make_face()
        extrude(amount=CUT_EXTRUDE36_DEPTH, mode=Mode.SUBTRACT)


with BuildPart() as cut_extrude35_piece_2:
    # of the separate pieces the step leaves, piece 2, a body of its own (cut_extrude35_pieces)
    add(part.part.solids().sort_by_distance((120, 40, -55))[0])

    # Sketch38 → Boss-Extrude16 (add, up to next)
    with BuildSketch(Plane(origin=(0, 0, -45), x_dir=(-1, 0, 0), z_dir=(0, 0, -1)), mode=Mode.PRIVATE) as boss_extrude16_sk1:
        with Locations((-110, 20)):
            Rectangle(SKETCH38_W, SKETCH38_H)
    boss_extrude16_tool1 = extrude(boss_extrude16_sk1.sketch, amount=BOSS_EXTRUDE16_REACH, mode=Mode.PRIVATE) - cut_extrude35_piece_2.part


with BuildPart() as cut_extrude35_piece_3:
    # of the separate pieces the step leaves, piece 3, a body of its own (cut_extrude35_pieces)
    add(part.part.solids().sort_by_distance((100, 20, 0))[0])


with BuildPart() as cut_extrude36_piece_1:
    # of the separate pieces the step leaves, piece 1, a body of its own (cut_extrude36_pieces)
    add(cut_extrude35_piece_1.part.solids().sort_by_distance((100, 40, 0))[0])


with BuildPart() as cut_extrude36_piece_2:
    # of the separate pieces the step leaves, piece 2, a body of its own (cut_extrude36_pieces)
    add(cut_extrude35_piece_1.part.solids().sort_by_distance((80, 90, -30))[0])


with BuildPart() as cut_extrude35_piece_2_1:
    add(cut_extrude35_piece_2.part)

    add(cut_extrude35_piece_3.part)  # Boss-Extrude16 merges Cut-Extrude35 piece 3
    add(boss_extrude16_tool1.solids().sort_by_distance((110, 20, -45))[0])


    with SkipClean():  # the faces are left unmerged after this step: merging them gives an invalid solid
        add(cut_extrude36_piece_1.part)  # Boss-Extrude17 merges Cut-Extrude36 piece 1

        add(cut_extrude36_piece_2.part)  # Boss-Extrude17 merges Cut-Extrude36 piece 2
        # Sketch39 → Boss-Extrude17 (add)
        with BuildSketch(Plane(origin=(100, 0, 0), x_dir=(0, 0, -1), z_dir=(1, 0, 0))):
            with BuildLine():
                ThreePointArc((30, 90), (27.071067812, 82.928932188), (20, 80))
                Line((20, 80), (10, 80))
                Line((10, 80), (10, 50))
                Line((10, 50), (90, 50))
                Line((90, 50), (90, 80))
                Line((90, 80), (80, 80))
                ThreePointArc((80, 80), (72.928932188, 82.928932188), (70, 90))
                ThreePointArc((70, 90), (50, 70), (30, 90))
            make_face()
            Polygon((90, 80), (90, 50), (10, 50), (10, 80), (0, 80), (0, 40), (100, 40), (100, 80), align=None)
        extrude(amount=BOSS_EXTRUDE17_DEPTH)

    # Sketch40 → Boss-Extrude18 (add)
    with SkipClean():  # the faces are left unmerged after this step: merging them gives an invalid solid
        with BuildSketch(Plane.XZ.offset(-40)):
            with Locations((75, -50)):
                Rectangle(SKETCH40_W, SKETCH40_H)
        extrude(amount=BOSS_EXTRUDE18_DEPTH)

    # Chamfer1
    # the kernel refuses this chamfer: 50, 40 mm, written as the material it takes off along each edge
    with BuildSketch(Plane(origin=(50, 0, 83.942180887), x_dir=(1, 0, 0), z_dir=(0, 0, -1))) as chamfer1_piece_1:
        Polygon((CHAMFER1_SIZE, 0), (0, -CHAMFER1_SIZE_2), (0, 0), align=None)
    extrude(amount=267.884361773, mode=Mode.SUBTRACT)


with BuildPart() as body_2:
    # Sketch41 → Boss-Extrude21 (new, symmetric)
    with BuildSketch(Plane.XY.offset(-50)):
        with Locations((25, 60)):
            Rectangle(SKETCH41_W, SKETCH41_H)
    extrude(amount=BOSS_EXTRUDE21_DEPTH, both=True)


with BuildPart() as body_3:
    # Sketch41 → Boss-Extrude21 2 (new, symmetric)
    with BuildSketch(Plane.XY.offset(-50)):
        with Locations((85, 60)):
            Rectangle(SKETCH41_W_2, SKETCH41_H)
    extrude(amount=BOSS_EXTRUDE21_2_DEPTH, both=True)


solid = Compound([cut_extrude35_piece_2_1.part, body_2.part, body_3.part])
